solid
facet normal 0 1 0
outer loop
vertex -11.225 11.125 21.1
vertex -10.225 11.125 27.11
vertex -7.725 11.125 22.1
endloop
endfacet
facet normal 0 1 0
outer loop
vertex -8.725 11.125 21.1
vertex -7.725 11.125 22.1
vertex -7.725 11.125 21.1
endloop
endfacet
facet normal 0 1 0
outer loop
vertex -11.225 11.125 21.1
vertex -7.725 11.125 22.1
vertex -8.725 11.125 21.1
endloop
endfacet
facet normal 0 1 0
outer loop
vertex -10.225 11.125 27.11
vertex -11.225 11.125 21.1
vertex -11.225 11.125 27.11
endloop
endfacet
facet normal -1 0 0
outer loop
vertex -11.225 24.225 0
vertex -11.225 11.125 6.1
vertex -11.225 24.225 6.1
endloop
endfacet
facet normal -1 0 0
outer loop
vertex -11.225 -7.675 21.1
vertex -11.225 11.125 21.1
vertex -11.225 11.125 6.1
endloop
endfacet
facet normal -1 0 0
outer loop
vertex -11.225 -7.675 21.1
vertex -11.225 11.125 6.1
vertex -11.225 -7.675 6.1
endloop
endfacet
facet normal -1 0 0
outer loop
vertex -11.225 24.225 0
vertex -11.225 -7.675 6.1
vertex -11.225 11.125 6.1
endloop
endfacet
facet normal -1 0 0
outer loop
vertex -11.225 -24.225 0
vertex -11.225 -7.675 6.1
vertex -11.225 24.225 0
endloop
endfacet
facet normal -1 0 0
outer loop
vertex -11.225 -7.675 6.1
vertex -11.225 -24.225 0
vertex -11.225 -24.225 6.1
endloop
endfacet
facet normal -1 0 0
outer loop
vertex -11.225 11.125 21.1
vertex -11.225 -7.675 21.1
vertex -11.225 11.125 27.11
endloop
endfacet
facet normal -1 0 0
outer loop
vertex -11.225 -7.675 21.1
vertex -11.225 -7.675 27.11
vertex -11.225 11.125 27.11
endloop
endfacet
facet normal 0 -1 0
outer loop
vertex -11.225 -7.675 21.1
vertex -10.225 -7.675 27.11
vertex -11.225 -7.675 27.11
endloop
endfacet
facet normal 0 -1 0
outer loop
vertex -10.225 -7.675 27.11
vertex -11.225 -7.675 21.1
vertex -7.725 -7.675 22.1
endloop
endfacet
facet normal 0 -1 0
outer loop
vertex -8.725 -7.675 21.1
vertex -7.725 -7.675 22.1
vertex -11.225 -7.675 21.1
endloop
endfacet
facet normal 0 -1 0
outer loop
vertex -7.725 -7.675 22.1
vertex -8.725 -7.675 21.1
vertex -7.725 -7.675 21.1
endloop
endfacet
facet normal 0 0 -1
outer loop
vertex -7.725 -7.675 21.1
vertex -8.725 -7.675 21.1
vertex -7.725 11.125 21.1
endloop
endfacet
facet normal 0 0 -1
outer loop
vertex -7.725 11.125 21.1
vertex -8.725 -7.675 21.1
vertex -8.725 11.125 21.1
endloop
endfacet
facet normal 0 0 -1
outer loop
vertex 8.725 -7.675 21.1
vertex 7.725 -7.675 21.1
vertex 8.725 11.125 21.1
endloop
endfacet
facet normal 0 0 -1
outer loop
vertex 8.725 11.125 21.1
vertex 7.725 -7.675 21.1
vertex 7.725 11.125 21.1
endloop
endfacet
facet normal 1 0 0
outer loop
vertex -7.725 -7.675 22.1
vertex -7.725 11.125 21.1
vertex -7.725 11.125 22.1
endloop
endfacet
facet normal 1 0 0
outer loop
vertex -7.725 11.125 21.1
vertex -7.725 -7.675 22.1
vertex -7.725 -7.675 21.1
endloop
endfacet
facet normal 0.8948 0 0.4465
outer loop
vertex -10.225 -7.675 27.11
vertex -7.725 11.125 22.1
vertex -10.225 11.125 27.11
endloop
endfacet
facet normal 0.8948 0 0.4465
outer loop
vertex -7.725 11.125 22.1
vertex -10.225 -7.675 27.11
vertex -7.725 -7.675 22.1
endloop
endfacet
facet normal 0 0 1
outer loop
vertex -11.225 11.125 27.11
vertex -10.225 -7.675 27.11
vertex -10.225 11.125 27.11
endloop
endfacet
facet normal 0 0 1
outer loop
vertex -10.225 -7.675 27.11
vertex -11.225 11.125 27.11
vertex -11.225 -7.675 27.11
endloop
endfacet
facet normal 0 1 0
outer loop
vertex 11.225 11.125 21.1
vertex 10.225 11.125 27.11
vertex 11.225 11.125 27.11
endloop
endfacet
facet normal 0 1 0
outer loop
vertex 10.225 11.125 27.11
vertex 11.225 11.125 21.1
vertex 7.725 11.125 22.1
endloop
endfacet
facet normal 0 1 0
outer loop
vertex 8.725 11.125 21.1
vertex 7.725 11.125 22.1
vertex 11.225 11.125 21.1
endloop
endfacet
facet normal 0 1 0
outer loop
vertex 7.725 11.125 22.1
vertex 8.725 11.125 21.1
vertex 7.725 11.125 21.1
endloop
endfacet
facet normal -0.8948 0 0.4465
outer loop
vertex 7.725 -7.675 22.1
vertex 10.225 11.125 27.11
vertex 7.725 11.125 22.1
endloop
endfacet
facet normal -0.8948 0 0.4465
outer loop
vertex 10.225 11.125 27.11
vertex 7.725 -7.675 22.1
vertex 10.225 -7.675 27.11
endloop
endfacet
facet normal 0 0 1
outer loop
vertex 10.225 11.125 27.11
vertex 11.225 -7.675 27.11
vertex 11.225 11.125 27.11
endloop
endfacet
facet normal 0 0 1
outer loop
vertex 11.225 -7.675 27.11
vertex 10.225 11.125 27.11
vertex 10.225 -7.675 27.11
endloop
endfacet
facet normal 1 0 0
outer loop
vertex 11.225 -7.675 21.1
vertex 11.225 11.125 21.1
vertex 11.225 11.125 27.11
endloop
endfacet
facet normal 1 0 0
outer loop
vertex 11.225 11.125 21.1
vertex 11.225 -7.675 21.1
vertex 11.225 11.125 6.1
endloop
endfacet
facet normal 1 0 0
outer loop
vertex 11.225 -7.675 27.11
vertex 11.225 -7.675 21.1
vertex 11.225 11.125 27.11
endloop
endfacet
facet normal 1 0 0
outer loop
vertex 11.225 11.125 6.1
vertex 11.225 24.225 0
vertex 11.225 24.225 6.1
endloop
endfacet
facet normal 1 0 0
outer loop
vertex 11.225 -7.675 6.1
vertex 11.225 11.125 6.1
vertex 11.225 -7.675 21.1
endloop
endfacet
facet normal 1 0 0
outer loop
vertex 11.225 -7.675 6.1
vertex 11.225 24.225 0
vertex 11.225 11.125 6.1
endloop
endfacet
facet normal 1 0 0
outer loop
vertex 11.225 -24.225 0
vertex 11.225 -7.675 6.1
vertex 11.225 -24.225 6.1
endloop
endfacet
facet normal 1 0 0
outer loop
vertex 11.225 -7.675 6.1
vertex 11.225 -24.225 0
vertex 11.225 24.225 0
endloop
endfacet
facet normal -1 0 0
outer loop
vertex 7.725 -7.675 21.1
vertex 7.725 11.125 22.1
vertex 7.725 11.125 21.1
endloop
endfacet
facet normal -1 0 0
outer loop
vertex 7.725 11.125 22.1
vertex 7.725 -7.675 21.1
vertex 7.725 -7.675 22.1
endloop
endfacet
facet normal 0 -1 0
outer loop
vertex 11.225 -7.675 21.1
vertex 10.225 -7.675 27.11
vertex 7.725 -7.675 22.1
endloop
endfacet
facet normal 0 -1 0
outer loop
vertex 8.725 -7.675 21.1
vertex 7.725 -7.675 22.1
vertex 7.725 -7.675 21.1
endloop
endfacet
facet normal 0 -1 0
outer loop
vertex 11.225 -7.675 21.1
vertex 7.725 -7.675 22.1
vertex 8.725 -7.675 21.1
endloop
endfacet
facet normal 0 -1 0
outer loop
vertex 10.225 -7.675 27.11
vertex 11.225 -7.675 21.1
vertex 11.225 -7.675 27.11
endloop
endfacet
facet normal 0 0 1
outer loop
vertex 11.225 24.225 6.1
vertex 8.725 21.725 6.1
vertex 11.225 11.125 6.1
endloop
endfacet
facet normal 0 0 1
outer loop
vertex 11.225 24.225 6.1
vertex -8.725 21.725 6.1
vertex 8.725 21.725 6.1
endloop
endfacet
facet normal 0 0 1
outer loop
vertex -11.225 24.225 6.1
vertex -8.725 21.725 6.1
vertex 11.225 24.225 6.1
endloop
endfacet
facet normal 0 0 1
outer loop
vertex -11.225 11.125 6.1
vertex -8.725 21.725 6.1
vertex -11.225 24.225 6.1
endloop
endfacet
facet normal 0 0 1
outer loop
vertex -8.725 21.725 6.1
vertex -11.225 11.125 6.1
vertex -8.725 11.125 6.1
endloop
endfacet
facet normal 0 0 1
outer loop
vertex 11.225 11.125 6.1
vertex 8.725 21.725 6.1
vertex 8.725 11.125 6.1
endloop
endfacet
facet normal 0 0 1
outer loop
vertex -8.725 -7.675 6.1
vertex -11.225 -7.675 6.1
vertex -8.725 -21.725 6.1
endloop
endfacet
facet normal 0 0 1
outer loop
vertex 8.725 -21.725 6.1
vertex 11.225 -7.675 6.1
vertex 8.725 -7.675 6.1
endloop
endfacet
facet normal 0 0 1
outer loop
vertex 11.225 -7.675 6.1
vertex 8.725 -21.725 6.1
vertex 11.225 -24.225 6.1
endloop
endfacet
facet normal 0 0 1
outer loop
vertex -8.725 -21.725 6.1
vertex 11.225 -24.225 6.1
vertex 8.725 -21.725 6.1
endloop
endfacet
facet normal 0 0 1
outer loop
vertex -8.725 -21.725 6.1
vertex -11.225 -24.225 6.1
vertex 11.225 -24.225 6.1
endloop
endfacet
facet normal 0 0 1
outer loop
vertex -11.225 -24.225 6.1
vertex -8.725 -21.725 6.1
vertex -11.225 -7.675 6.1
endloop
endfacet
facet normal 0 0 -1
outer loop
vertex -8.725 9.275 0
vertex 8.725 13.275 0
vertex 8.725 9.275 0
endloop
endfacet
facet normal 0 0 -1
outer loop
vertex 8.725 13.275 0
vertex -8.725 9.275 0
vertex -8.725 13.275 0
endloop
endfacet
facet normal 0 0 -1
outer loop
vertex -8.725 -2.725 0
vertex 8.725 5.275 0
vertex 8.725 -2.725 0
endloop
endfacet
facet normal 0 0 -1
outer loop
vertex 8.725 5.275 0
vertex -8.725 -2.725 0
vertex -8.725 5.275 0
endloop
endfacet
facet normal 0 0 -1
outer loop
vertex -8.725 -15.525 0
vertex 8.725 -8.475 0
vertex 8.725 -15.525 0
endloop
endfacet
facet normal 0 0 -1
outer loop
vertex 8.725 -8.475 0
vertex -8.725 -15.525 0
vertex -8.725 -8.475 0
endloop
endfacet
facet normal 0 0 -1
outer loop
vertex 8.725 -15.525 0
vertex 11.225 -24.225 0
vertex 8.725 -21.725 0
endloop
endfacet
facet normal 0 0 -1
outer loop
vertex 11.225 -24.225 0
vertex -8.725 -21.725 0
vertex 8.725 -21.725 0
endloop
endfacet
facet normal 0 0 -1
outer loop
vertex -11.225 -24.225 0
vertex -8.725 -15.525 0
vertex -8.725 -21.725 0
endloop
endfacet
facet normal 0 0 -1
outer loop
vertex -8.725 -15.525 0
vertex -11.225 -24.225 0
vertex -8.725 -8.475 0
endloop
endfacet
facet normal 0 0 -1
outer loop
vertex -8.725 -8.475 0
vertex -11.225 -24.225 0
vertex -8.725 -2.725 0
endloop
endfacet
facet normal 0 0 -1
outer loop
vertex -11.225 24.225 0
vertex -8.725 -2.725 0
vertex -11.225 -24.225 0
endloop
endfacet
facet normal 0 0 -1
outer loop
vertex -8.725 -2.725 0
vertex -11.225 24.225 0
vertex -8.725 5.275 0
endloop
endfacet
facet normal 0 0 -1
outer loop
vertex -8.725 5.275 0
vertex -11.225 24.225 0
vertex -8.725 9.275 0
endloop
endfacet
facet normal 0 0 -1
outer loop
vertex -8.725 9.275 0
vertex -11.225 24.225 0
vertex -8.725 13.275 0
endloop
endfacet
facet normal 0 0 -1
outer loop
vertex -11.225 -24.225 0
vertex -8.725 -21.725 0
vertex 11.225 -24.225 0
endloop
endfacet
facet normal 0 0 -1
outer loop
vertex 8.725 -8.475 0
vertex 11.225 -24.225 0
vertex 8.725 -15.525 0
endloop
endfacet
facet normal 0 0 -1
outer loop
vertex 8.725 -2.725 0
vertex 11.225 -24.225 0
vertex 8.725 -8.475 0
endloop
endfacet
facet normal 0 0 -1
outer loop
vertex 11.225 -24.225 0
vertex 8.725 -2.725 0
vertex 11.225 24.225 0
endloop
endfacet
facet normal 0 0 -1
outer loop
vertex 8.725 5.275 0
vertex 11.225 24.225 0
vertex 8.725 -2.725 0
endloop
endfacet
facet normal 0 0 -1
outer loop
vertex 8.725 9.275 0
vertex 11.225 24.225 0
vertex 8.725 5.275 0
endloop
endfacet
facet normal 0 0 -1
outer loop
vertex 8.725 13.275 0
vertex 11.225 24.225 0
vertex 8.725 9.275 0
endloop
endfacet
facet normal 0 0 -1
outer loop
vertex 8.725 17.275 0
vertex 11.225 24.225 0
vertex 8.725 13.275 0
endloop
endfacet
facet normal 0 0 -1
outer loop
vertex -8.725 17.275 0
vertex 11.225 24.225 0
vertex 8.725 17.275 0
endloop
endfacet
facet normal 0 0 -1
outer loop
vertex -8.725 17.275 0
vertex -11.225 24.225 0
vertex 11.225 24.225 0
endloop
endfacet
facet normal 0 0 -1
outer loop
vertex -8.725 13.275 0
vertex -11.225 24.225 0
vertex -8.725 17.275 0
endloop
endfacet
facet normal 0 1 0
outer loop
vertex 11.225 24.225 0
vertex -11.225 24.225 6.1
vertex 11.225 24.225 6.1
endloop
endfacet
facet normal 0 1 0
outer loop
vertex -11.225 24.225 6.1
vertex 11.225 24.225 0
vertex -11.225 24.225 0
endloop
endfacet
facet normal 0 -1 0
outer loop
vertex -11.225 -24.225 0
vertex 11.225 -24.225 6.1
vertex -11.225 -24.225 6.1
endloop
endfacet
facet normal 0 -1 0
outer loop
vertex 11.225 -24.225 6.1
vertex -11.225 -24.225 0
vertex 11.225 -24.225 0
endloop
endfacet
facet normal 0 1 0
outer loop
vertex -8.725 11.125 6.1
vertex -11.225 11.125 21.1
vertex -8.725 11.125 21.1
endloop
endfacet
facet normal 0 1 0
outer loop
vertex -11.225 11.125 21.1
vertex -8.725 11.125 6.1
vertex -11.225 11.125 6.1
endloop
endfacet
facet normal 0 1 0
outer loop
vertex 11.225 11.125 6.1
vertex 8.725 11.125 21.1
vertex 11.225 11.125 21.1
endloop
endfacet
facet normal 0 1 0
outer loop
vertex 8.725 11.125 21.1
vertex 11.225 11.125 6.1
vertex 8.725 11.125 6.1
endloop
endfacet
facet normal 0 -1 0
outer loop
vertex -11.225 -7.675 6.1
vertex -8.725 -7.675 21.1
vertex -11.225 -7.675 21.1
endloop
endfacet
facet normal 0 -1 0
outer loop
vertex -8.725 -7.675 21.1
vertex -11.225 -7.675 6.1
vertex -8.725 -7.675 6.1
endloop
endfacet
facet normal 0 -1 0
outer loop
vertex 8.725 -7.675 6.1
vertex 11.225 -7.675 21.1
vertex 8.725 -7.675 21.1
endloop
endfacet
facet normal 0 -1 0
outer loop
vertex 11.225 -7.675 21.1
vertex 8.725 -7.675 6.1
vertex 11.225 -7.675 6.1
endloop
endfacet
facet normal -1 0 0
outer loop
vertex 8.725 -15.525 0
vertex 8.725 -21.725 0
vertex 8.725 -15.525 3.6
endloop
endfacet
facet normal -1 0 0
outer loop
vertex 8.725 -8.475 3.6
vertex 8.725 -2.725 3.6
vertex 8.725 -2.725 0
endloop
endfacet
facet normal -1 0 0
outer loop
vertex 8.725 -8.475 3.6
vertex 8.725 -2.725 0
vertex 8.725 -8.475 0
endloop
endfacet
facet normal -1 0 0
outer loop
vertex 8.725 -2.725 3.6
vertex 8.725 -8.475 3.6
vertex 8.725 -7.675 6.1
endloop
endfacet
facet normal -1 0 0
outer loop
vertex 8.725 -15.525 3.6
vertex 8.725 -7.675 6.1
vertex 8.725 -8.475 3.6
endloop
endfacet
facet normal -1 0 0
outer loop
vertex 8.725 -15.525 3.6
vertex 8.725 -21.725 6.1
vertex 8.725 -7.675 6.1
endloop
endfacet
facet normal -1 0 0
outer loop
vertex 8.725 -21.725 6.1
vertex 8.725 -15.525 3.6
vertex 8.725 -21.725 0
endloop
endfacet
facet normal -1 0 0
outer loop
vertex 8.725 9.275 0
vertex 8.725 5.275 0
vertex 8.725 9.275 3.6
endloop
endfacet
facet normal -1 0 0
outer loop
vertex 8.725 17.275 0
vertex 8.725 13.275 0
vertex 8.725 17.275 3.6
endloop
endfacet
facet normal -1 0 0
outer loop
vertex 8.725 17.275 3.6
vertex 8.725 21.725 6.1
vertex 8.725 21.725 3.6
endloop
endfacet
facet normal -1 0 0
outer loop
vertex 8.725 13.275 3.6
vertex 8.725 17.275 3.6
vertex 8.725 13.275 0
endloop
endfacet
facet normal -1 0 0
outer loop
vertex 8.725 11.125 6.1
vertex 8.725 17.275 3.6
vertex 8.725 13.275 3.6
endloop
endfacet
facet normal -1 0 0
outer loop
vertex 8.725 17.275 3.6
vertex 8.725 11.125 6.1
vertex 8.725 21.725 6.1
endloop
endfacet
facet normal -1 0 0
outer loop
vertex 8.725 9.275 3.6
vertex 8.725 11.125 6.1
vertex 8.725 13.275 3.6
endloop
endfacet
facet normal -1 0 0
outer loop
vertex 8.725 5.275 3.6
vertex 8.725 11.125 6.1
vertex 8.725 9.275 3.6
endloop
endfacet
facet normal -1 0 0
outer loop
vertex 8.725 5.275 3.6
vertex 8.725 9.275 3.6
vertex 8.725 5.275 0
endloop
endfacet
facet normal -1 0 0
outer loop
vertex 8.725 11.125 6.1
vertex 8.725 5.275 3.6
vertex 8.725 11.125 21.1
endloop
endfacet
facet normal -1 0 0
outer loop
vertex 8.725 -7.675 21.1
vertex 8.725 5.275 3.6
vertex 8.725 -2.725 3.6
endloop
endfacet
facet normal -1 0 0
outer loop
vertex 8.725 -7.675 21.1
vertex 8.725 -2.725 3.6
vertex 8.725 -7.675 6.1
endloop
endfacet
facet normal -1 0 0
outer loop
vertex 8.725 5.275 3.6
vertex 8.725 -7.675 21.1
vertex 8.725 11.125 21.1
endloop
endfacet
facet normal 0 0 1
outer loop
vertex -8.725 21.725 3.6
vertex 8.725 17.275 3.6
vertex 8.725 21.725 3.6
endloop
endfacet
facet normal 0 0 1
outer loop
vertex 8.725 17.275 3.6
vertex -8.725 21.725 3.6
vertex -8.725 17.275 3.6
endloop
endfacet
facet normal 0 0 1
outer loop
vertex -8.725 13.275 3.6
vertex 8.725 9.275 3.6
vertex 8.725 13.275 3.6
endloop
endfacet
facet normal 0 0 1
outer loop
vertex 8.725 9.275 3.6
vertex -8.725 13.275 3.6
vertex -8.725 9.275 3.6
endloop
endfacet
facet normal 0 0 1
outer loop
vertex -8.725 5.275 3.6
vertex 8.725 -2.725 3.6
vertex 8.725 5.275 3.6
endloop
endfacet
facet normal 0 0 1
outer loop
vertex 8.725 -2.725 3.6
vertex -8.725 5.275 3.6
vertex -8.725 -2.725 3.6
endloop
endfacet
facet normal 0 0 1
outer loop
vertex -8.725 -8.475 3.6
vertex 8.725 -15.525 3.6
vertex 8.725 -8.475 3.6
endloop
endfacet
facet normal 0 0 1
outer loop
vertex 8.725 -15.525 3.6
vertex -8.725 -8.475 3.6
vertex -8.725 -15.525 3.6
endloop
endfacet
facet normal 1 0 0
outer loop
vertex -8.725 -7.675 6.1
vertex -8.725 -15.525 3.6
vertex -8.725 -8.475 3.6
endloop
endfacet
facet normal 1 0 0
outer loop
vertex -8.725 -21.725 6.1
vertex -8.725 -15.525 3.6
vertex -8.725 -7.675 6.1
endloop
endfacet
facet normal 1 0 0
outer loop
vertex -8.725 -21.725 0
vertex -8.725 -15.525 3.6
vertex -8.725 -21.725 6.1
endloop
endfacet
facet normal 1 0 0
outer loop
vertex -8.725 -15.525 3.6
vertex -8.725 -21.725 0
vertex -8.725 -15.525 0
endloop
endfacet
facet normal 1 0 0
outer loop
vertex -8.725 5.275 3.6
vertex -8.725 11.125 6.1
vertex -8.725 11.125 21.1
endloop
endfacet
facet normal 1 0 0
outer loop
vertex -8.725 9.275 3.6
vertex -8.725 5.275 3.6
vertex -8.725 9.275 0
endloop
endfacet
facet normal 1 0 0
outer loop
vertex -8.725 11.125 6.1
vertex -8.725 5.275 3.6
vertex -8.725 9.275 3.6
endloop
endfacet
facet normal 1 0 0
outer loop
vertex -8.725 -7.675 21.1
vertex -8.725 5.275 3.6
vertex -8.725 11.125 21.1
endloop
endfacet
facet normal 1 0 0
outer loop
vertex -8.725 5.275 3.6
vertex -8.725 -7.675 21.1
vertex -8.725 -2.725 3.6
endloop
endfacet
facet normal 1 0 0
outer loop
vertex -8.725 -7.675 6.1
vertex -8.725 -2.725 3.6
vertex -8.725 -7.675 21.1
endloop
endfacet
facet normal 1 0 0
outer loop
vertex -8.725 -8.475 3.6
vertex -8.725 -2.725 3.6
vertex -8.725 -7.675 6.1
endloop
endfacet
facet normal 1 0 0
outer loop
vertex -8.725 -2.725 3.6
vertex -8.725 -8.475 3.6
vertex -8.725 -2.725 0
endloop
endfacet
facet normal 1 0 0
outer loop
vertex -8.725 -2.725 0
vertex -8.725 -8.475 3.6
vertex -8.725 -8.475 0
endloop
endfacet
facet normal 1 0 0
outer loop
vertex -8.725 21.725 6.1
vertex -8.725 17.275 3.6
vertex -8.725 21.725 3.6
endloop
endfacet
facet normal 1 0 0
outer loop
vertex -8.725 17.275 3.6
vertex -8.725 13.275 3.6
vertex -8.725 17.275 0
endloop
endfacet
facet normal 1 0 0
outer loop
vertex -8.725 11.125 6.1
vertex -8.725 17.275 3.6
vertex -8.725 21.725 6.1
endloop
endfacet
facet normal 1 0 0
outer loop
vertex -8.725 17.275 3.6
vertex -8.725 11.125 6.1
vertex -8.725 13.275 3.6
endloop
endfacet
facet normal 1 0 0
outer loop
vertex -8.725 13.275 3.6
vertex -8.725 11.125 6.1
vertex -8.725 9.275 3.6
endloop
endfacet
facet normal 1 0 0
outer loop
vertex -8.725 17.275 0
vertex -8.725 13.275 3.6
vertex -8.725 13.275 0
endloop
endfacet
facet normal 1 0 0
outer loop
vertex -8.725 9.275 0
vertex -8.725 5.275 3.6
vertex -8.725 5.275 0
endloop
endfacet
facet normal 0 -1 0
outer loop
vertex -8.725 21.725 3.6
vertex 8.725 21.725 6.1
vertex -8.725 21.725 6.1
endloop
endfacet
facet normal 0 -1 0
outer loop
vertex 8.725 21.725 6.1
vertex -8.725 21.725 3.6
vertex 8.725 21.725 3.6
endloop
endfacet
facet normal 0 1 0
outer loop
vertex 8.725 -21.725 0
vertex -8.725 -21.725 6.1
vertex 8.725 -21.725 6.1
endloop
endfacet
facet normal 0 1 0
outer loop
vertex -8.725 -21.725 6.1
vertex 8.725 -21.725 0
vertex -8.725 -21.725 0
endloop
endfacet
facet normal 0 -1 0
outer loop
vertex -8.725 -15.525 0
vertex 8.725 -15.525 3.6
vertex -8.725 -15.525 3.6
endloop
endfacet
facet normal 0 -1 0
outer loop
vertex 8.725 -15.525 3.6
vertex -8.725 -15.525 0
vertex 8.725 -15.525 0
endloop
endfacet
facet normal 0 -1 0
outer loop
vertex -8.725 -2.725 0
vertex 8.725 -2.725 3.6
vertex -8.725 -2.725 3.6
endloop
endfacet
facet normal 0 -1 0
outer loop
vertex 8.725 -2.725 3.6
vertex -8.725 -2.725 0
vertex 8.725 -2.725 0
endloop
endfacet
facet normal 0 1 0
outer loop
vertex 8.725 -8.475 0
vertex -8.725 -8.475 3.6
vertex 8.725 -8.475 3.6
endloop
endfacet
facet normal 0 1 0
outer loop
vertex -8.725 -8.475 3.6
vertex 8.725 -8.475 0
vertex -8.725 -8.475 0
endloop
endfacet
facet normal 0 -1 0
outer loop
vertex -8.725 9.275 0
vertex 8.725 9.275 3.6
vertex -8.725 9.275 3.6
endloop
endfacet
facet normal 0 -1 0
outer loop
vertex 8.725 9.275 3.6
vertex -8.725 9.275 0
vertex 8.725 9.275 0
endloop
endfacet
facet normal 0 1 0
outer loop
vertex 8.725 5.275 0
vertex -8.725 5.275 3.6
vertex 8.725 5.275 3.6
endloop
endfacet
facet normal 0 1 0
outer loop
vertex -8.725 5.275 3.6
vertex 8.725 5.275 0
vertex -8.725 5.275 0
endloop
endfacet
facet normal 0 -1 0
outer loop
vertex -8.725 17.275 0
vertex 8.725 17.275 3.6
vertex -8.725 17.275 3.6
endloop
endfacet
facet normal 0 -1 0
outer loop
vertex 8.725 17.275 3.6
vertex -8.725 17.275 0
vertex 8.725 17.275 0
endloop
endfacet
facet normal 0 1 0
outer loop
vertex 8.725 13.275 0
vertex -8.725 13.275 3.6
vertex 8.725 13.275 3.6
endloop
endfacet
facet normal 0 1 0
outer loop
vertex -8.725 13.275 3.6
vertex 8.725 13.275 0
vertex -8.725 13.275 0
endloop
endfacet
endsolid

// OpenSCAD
include <mower_measurements.scad>
$fn=360;

module nano_mount_plus(){
    // support pillars
    translate([-nano_pin_width/2-nano_mount_thickness,-nano_length/2-nano_mount_thickness+nano_pin_offset-0.5,0]){
        cube([nano_mount_thickness,nano_mount_thickness,nano_pin_depth+nano_board_height+nano_offset_height+2]);
    }
    translate([nano_pin_width/2,-nano_length/2-nano_mount_thickness+nano_pin_offset-0.5,0]){
        cube([nano_mount_thickness,nano_mount_thickness,nano_pin_depth+nano_board_height+nano_offset_height+2]);
    }
    translate([-nano_usb_width/2-nano_mount_thickness,nano_length/2-nano_pin_offset+0.5,0]){
        cube([nano_mount_thickness,nano_mount_thickness,nano_pin_depth+nano_offset_height+nano_board_height]);
    }
    translate([nano_usb_width/2,nano_length/2-nano_pin_offset+0.5,0]){
        cube([nano_mount_thickness,nano_mount_thickness,nano_pin_depth+nano_offset_height+nano_board_height]);
    }
}

module nano_mount_minus(){
    translate([-nano_width/2,-nano_length/2,nano_pin_depth+nano_offset_height]){
        cube([nano_width,nano_length,nano_board_height]);
    }
}

module nano_mount(){
    difference(){
        nano_mount_plus();
        nano_mount_minus();
    }
}

module rtc_mount_plus(){
    translate([-rtc_width/2-rtc_wall_thickness,-rtc_length/2-rtc_wall_thickness,0]){
        cube([rtc_width+2*rtc_wall_thickness,rtc_length+2*rtc_wall_thickness,rtc_mount_hole_depth+rtc_wall_thickness]);
    }
}

module rtc_mount_minus(){
    translate([-rtc_width/2,-rtc_length/2,rtc_mount_hole_depth]){
        cube([rtc_width,rtc_length,rtc_wall_thickness]);
    }
    translate([-rtc_pin_width/2,-rtc_length/2,0]){
        cube([rtc_pin_width,rtc_length,rtc_mount_hole_depth]);
    }
    translate([-rtc_width/2,-rtc_length/2+2*rtc_mounting_hole_diameter,0]){
        cube([rtc_width,rtc_length-4*rtc_mounting_hole_diameter,rtc_mount_hole_depth]);
    }
    for(x=[-rtc_mounting_hole_x_offset,rtc_mounting_hole_x_offset]){
        for(y=[-rtc_mounting_hole_y_offset,rtc_mounting_hole_y_offset]){
            translate([x,y,0]) cylinder(d=screw_diameter,h=rtc_mount_hole_depth);
        }
    }
}

module rtc_mount(){
    difference(){
        rtc_mount_plus();
        rtc_mount_minus();
    }
}

module relay_mount_plus(){
    translate([-relay_width/2-relay_wall_thickness,-relay_length/2-relay_wall_thickness,0]){
        cube([relay_width+2*relay_wall_thickness,relay_length+2*relay_wall_thickness,relay_wall_thickness+relay_pin_depth+relay_offset_height]);
    }
    translate([-relay_width/2-relay_wall_thickness,-relay_length/2+relay_snap_offset,relay_pin_depth+relay_offset_height]){
        cube([relay_width+2*relay_wall_thickness,relay_unit_length,relay_height]);
    }
    translate([0,relay_unit_length/2+relay_snap_offset-relay_length/2,0]){
        for(rotate=[0,180]){
            rotate([0,0,rotate]){
                translate([-relay_width/2-relay_wall_thickness,-relay_unit_length/2,relay_pin_depth+relay_offset_height+relay_height]){
                    hull(){
                        cube([relay_wall_thickness+relay_snap_overhang,relay_unit_length,1]);
                        translate([0,0,relay_snap_height]){
                            cube([relay_snap_overhang,relay_unit_length,0.01]);
                        }
                    }
                }
            }
        }
    }
}

module relay_mount_minus(){
    translate([-relay_width/2,-relay_length/2,relay_pin_depth+relay_offset_height]){
        cube([relay_width,relay_length,relay_height]);
    }
    translate([-relay_width/2,-relay_length/2,0]){
        cube([relay_width,relay_support1_start,relay_pin_depth+relay_offset_height]);
    }
    translate([-relay_width/2,-relay_length/2+relay_support1_stop,0]){
        cube([relay_width,relay_support2_start-relay_support1_stop,relay_pin_depth+relay_offset_height]);
    }
    translate([-relay_width/2,-relay_length/2+relay_support2_stop,0]){
        cube([relay_width,relay_support3_start-relay_support2_stop,relay_pin_depth+relay_offset_height]);
    }
    translate([-relay_width/2,-relay_length/2+relay_support3_stop,0]){
        cube([relay_width,relay_support4_start-relay_support3_stop,relay_pin_depth+relay_offset_height]);
    }
}

module relay_mount(){
    difference(){
        relay_mount_plus();
        relay_mount_minus();
    }
}

relay_mount();
